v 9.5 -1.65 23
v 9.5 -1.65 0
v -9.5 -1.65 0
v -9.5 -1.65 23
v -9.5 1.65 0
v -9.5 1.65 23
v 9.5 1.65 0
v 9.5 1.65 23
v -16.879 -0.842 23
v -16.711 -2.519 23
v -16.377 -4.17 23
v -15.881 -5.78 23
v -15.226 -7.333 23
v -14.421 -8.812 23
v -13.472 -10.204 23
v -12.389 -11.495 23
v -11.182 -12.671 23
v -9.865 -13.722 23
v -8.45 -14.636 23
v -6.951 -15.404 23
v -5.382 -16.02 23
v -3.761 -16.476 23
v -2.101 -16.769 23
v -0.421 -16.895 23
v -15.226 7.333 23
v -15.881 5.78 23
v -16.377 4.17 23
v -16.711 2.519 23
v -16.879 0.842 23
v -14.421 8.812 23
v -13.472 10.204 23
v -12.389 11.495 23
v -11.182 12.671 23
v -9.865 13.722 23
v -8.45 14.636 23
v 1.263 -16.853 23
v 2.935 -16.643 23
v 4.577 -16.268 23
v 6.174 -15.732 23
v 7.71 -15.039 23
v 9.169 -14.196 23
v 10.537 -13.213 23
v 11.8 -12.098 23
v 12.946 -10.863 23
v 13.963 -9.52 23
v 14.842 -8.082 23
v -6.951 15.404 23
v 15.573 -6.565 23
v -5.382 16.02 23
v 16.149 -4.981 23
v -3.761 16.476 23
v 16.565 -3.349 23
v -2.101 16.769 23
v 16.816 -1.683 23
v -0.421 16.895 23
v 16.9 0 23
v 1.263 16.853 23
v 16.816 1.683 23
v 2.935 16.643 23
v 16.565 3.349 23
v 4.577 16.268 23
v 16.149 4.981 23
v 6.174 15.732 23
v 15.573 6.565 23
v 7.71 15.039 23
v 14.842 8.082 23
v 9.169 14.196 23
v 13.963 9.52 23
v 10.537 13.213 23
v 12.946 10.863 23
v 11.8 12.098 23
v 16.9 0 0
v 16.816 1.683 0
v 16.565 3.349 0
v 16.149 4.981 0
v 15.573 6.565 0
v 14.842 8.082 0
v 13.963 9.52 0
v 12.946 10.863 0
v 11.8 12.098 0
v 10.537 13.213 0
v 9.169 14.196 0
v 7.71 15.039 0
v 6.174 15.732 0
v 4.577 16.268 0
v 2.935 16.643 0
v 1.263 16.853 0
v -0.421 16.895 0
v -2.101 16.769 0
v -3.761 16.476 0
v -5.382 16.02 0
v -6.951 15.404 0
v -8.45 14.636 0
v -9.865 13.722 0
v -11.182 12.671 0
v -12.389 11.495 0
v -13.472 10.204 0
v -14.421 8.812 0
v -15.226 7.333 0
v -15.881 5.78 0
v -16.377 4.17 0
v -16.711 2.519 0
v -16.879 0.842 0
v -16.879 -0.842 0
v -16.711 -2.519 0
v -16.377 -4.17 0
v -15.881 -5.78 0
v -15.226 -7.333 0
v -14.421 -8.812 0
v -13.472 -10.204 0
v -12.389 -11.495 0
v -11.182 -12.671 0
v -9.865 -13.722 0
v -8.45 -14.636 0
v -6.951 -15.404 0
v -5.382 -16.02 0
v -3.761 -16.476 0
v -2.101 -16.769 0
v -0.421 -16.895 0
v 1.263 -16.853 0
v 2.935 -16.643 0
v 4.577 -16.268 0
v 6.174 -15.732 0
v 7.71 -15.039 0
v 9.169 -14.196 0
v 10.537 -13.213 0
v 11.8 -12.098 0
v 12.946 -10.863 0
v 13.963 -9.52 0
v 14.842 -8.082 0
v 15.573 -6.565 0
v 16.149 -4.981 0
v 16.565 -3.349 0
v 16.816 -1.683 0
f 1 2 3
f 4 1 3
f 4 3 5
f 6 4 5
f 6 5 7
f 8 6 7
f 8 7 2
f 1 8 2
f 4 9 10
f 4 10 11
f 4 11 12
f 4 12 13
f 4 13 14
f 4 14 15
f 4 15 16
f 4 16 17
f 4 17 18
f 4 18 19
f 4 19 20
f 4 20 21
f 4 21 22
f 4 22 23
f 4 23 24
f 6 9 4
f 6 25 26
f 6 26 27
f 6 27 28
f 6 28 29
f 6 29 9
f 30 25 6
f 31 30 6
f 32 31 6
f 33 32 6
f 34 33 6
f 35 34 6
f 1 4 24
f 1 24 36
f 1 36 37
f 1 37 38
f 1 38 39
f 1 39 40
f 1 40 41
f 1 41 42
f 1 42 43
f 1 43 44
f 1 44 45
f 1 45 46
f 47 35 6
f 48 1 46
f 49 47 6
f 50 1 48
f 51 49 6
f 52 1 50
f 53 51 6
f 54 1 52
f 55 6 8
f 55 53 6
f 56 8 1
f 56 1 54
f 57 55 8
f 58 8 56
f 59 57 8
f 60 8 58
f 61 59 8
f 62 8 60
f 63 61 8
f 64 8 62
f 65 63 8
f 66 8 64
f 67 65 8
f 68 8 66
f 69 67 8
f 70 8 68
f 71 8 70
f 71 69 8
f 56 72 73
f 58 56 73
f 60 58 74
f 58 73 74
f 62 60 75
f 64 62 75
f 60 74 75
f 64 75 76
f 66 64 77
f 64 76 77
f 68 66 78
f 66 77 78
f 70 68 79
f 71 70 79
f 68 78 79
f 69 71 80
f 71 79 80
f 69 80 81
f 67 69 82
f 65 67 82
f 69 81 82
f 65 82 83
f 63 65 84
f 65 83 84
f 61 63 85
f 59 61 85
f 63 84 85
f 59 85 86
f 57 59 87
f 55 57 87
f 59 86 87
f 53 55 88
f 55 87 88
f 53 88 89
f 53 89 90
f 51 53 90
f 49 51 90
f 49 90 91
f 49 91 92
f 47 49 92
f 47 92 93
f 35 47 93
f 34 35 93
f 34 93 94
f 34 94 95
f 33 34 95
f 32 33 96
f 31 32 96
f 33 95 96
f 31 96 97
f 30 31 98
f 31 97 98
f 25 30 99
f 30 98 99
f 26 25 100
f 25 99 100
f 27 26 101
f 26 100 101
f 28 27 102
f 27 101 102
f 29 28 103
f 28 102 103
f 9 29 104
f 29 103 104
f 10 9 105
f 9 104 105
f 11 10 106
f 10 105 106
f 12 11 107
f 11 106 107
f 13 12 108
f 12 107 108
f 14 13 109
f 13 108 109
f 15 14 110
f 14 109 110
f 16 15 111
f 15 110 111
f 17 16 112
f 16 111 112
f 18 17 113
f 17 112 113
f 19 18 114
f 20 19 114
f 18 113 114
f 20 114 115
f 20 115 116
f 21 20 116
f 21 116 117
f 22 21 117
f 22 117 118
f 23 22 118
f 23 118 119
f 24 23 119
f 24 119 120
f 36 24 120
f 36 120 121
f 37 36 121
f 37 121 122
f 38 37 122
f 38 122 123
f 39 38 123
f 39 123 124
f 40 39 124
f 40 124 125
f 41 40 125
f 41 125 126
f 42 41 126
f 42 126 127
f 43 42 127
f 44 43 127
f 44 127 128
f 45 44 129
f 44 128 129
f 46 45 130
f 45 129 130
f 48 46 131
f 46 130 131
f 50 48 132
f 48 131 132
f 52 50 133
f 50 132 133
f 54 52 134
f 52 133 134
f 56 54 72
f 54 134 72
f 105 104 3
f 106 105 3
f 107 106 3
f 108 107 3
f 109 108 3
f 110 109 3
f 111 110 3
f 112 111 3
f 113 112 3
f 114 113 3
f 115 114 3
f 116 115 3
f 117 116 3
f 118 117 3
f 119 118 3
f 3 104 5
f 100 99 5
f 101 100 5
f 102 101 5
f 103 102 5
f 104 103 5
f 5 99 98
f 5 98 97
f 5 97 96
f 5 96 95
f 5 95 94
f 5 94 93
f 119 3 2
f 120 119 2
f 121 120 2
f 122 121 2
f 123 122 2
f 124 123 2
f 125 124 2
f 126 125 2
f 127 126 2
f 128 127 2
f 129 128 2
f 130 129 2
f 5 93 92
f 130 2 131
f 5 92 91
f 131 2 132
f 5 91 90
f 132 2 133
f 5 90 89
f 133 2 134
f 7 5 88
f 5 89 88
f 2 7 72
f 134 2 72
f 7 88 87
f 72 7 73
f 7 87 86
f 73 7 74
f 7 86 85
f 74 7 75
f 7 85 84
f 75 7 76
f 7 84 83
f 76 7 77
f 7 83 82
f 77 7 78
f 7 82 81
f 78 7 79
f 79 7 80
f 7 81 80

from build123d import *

# Parameters (mm, degrees)
F0_R     = 16.9
F1_DEPTH = 23


with BuildPart() as f1:
    # F0 (on Top) → F1 (new body)
    with BuildSketch(Plane.XY):
        Circle(F0_R)
        Polygon((-9.5, -1.65), (-9.5, 0), (-9.5, 1.65), (0, 1.65), (9.5, 1.65), (9.5, 0), (9.5, -1.65), (0, -1.65), align=None, mode=Mode.SUBTRACT)
    extrude(amount=F1_DEPTH)


solid = f1.part
